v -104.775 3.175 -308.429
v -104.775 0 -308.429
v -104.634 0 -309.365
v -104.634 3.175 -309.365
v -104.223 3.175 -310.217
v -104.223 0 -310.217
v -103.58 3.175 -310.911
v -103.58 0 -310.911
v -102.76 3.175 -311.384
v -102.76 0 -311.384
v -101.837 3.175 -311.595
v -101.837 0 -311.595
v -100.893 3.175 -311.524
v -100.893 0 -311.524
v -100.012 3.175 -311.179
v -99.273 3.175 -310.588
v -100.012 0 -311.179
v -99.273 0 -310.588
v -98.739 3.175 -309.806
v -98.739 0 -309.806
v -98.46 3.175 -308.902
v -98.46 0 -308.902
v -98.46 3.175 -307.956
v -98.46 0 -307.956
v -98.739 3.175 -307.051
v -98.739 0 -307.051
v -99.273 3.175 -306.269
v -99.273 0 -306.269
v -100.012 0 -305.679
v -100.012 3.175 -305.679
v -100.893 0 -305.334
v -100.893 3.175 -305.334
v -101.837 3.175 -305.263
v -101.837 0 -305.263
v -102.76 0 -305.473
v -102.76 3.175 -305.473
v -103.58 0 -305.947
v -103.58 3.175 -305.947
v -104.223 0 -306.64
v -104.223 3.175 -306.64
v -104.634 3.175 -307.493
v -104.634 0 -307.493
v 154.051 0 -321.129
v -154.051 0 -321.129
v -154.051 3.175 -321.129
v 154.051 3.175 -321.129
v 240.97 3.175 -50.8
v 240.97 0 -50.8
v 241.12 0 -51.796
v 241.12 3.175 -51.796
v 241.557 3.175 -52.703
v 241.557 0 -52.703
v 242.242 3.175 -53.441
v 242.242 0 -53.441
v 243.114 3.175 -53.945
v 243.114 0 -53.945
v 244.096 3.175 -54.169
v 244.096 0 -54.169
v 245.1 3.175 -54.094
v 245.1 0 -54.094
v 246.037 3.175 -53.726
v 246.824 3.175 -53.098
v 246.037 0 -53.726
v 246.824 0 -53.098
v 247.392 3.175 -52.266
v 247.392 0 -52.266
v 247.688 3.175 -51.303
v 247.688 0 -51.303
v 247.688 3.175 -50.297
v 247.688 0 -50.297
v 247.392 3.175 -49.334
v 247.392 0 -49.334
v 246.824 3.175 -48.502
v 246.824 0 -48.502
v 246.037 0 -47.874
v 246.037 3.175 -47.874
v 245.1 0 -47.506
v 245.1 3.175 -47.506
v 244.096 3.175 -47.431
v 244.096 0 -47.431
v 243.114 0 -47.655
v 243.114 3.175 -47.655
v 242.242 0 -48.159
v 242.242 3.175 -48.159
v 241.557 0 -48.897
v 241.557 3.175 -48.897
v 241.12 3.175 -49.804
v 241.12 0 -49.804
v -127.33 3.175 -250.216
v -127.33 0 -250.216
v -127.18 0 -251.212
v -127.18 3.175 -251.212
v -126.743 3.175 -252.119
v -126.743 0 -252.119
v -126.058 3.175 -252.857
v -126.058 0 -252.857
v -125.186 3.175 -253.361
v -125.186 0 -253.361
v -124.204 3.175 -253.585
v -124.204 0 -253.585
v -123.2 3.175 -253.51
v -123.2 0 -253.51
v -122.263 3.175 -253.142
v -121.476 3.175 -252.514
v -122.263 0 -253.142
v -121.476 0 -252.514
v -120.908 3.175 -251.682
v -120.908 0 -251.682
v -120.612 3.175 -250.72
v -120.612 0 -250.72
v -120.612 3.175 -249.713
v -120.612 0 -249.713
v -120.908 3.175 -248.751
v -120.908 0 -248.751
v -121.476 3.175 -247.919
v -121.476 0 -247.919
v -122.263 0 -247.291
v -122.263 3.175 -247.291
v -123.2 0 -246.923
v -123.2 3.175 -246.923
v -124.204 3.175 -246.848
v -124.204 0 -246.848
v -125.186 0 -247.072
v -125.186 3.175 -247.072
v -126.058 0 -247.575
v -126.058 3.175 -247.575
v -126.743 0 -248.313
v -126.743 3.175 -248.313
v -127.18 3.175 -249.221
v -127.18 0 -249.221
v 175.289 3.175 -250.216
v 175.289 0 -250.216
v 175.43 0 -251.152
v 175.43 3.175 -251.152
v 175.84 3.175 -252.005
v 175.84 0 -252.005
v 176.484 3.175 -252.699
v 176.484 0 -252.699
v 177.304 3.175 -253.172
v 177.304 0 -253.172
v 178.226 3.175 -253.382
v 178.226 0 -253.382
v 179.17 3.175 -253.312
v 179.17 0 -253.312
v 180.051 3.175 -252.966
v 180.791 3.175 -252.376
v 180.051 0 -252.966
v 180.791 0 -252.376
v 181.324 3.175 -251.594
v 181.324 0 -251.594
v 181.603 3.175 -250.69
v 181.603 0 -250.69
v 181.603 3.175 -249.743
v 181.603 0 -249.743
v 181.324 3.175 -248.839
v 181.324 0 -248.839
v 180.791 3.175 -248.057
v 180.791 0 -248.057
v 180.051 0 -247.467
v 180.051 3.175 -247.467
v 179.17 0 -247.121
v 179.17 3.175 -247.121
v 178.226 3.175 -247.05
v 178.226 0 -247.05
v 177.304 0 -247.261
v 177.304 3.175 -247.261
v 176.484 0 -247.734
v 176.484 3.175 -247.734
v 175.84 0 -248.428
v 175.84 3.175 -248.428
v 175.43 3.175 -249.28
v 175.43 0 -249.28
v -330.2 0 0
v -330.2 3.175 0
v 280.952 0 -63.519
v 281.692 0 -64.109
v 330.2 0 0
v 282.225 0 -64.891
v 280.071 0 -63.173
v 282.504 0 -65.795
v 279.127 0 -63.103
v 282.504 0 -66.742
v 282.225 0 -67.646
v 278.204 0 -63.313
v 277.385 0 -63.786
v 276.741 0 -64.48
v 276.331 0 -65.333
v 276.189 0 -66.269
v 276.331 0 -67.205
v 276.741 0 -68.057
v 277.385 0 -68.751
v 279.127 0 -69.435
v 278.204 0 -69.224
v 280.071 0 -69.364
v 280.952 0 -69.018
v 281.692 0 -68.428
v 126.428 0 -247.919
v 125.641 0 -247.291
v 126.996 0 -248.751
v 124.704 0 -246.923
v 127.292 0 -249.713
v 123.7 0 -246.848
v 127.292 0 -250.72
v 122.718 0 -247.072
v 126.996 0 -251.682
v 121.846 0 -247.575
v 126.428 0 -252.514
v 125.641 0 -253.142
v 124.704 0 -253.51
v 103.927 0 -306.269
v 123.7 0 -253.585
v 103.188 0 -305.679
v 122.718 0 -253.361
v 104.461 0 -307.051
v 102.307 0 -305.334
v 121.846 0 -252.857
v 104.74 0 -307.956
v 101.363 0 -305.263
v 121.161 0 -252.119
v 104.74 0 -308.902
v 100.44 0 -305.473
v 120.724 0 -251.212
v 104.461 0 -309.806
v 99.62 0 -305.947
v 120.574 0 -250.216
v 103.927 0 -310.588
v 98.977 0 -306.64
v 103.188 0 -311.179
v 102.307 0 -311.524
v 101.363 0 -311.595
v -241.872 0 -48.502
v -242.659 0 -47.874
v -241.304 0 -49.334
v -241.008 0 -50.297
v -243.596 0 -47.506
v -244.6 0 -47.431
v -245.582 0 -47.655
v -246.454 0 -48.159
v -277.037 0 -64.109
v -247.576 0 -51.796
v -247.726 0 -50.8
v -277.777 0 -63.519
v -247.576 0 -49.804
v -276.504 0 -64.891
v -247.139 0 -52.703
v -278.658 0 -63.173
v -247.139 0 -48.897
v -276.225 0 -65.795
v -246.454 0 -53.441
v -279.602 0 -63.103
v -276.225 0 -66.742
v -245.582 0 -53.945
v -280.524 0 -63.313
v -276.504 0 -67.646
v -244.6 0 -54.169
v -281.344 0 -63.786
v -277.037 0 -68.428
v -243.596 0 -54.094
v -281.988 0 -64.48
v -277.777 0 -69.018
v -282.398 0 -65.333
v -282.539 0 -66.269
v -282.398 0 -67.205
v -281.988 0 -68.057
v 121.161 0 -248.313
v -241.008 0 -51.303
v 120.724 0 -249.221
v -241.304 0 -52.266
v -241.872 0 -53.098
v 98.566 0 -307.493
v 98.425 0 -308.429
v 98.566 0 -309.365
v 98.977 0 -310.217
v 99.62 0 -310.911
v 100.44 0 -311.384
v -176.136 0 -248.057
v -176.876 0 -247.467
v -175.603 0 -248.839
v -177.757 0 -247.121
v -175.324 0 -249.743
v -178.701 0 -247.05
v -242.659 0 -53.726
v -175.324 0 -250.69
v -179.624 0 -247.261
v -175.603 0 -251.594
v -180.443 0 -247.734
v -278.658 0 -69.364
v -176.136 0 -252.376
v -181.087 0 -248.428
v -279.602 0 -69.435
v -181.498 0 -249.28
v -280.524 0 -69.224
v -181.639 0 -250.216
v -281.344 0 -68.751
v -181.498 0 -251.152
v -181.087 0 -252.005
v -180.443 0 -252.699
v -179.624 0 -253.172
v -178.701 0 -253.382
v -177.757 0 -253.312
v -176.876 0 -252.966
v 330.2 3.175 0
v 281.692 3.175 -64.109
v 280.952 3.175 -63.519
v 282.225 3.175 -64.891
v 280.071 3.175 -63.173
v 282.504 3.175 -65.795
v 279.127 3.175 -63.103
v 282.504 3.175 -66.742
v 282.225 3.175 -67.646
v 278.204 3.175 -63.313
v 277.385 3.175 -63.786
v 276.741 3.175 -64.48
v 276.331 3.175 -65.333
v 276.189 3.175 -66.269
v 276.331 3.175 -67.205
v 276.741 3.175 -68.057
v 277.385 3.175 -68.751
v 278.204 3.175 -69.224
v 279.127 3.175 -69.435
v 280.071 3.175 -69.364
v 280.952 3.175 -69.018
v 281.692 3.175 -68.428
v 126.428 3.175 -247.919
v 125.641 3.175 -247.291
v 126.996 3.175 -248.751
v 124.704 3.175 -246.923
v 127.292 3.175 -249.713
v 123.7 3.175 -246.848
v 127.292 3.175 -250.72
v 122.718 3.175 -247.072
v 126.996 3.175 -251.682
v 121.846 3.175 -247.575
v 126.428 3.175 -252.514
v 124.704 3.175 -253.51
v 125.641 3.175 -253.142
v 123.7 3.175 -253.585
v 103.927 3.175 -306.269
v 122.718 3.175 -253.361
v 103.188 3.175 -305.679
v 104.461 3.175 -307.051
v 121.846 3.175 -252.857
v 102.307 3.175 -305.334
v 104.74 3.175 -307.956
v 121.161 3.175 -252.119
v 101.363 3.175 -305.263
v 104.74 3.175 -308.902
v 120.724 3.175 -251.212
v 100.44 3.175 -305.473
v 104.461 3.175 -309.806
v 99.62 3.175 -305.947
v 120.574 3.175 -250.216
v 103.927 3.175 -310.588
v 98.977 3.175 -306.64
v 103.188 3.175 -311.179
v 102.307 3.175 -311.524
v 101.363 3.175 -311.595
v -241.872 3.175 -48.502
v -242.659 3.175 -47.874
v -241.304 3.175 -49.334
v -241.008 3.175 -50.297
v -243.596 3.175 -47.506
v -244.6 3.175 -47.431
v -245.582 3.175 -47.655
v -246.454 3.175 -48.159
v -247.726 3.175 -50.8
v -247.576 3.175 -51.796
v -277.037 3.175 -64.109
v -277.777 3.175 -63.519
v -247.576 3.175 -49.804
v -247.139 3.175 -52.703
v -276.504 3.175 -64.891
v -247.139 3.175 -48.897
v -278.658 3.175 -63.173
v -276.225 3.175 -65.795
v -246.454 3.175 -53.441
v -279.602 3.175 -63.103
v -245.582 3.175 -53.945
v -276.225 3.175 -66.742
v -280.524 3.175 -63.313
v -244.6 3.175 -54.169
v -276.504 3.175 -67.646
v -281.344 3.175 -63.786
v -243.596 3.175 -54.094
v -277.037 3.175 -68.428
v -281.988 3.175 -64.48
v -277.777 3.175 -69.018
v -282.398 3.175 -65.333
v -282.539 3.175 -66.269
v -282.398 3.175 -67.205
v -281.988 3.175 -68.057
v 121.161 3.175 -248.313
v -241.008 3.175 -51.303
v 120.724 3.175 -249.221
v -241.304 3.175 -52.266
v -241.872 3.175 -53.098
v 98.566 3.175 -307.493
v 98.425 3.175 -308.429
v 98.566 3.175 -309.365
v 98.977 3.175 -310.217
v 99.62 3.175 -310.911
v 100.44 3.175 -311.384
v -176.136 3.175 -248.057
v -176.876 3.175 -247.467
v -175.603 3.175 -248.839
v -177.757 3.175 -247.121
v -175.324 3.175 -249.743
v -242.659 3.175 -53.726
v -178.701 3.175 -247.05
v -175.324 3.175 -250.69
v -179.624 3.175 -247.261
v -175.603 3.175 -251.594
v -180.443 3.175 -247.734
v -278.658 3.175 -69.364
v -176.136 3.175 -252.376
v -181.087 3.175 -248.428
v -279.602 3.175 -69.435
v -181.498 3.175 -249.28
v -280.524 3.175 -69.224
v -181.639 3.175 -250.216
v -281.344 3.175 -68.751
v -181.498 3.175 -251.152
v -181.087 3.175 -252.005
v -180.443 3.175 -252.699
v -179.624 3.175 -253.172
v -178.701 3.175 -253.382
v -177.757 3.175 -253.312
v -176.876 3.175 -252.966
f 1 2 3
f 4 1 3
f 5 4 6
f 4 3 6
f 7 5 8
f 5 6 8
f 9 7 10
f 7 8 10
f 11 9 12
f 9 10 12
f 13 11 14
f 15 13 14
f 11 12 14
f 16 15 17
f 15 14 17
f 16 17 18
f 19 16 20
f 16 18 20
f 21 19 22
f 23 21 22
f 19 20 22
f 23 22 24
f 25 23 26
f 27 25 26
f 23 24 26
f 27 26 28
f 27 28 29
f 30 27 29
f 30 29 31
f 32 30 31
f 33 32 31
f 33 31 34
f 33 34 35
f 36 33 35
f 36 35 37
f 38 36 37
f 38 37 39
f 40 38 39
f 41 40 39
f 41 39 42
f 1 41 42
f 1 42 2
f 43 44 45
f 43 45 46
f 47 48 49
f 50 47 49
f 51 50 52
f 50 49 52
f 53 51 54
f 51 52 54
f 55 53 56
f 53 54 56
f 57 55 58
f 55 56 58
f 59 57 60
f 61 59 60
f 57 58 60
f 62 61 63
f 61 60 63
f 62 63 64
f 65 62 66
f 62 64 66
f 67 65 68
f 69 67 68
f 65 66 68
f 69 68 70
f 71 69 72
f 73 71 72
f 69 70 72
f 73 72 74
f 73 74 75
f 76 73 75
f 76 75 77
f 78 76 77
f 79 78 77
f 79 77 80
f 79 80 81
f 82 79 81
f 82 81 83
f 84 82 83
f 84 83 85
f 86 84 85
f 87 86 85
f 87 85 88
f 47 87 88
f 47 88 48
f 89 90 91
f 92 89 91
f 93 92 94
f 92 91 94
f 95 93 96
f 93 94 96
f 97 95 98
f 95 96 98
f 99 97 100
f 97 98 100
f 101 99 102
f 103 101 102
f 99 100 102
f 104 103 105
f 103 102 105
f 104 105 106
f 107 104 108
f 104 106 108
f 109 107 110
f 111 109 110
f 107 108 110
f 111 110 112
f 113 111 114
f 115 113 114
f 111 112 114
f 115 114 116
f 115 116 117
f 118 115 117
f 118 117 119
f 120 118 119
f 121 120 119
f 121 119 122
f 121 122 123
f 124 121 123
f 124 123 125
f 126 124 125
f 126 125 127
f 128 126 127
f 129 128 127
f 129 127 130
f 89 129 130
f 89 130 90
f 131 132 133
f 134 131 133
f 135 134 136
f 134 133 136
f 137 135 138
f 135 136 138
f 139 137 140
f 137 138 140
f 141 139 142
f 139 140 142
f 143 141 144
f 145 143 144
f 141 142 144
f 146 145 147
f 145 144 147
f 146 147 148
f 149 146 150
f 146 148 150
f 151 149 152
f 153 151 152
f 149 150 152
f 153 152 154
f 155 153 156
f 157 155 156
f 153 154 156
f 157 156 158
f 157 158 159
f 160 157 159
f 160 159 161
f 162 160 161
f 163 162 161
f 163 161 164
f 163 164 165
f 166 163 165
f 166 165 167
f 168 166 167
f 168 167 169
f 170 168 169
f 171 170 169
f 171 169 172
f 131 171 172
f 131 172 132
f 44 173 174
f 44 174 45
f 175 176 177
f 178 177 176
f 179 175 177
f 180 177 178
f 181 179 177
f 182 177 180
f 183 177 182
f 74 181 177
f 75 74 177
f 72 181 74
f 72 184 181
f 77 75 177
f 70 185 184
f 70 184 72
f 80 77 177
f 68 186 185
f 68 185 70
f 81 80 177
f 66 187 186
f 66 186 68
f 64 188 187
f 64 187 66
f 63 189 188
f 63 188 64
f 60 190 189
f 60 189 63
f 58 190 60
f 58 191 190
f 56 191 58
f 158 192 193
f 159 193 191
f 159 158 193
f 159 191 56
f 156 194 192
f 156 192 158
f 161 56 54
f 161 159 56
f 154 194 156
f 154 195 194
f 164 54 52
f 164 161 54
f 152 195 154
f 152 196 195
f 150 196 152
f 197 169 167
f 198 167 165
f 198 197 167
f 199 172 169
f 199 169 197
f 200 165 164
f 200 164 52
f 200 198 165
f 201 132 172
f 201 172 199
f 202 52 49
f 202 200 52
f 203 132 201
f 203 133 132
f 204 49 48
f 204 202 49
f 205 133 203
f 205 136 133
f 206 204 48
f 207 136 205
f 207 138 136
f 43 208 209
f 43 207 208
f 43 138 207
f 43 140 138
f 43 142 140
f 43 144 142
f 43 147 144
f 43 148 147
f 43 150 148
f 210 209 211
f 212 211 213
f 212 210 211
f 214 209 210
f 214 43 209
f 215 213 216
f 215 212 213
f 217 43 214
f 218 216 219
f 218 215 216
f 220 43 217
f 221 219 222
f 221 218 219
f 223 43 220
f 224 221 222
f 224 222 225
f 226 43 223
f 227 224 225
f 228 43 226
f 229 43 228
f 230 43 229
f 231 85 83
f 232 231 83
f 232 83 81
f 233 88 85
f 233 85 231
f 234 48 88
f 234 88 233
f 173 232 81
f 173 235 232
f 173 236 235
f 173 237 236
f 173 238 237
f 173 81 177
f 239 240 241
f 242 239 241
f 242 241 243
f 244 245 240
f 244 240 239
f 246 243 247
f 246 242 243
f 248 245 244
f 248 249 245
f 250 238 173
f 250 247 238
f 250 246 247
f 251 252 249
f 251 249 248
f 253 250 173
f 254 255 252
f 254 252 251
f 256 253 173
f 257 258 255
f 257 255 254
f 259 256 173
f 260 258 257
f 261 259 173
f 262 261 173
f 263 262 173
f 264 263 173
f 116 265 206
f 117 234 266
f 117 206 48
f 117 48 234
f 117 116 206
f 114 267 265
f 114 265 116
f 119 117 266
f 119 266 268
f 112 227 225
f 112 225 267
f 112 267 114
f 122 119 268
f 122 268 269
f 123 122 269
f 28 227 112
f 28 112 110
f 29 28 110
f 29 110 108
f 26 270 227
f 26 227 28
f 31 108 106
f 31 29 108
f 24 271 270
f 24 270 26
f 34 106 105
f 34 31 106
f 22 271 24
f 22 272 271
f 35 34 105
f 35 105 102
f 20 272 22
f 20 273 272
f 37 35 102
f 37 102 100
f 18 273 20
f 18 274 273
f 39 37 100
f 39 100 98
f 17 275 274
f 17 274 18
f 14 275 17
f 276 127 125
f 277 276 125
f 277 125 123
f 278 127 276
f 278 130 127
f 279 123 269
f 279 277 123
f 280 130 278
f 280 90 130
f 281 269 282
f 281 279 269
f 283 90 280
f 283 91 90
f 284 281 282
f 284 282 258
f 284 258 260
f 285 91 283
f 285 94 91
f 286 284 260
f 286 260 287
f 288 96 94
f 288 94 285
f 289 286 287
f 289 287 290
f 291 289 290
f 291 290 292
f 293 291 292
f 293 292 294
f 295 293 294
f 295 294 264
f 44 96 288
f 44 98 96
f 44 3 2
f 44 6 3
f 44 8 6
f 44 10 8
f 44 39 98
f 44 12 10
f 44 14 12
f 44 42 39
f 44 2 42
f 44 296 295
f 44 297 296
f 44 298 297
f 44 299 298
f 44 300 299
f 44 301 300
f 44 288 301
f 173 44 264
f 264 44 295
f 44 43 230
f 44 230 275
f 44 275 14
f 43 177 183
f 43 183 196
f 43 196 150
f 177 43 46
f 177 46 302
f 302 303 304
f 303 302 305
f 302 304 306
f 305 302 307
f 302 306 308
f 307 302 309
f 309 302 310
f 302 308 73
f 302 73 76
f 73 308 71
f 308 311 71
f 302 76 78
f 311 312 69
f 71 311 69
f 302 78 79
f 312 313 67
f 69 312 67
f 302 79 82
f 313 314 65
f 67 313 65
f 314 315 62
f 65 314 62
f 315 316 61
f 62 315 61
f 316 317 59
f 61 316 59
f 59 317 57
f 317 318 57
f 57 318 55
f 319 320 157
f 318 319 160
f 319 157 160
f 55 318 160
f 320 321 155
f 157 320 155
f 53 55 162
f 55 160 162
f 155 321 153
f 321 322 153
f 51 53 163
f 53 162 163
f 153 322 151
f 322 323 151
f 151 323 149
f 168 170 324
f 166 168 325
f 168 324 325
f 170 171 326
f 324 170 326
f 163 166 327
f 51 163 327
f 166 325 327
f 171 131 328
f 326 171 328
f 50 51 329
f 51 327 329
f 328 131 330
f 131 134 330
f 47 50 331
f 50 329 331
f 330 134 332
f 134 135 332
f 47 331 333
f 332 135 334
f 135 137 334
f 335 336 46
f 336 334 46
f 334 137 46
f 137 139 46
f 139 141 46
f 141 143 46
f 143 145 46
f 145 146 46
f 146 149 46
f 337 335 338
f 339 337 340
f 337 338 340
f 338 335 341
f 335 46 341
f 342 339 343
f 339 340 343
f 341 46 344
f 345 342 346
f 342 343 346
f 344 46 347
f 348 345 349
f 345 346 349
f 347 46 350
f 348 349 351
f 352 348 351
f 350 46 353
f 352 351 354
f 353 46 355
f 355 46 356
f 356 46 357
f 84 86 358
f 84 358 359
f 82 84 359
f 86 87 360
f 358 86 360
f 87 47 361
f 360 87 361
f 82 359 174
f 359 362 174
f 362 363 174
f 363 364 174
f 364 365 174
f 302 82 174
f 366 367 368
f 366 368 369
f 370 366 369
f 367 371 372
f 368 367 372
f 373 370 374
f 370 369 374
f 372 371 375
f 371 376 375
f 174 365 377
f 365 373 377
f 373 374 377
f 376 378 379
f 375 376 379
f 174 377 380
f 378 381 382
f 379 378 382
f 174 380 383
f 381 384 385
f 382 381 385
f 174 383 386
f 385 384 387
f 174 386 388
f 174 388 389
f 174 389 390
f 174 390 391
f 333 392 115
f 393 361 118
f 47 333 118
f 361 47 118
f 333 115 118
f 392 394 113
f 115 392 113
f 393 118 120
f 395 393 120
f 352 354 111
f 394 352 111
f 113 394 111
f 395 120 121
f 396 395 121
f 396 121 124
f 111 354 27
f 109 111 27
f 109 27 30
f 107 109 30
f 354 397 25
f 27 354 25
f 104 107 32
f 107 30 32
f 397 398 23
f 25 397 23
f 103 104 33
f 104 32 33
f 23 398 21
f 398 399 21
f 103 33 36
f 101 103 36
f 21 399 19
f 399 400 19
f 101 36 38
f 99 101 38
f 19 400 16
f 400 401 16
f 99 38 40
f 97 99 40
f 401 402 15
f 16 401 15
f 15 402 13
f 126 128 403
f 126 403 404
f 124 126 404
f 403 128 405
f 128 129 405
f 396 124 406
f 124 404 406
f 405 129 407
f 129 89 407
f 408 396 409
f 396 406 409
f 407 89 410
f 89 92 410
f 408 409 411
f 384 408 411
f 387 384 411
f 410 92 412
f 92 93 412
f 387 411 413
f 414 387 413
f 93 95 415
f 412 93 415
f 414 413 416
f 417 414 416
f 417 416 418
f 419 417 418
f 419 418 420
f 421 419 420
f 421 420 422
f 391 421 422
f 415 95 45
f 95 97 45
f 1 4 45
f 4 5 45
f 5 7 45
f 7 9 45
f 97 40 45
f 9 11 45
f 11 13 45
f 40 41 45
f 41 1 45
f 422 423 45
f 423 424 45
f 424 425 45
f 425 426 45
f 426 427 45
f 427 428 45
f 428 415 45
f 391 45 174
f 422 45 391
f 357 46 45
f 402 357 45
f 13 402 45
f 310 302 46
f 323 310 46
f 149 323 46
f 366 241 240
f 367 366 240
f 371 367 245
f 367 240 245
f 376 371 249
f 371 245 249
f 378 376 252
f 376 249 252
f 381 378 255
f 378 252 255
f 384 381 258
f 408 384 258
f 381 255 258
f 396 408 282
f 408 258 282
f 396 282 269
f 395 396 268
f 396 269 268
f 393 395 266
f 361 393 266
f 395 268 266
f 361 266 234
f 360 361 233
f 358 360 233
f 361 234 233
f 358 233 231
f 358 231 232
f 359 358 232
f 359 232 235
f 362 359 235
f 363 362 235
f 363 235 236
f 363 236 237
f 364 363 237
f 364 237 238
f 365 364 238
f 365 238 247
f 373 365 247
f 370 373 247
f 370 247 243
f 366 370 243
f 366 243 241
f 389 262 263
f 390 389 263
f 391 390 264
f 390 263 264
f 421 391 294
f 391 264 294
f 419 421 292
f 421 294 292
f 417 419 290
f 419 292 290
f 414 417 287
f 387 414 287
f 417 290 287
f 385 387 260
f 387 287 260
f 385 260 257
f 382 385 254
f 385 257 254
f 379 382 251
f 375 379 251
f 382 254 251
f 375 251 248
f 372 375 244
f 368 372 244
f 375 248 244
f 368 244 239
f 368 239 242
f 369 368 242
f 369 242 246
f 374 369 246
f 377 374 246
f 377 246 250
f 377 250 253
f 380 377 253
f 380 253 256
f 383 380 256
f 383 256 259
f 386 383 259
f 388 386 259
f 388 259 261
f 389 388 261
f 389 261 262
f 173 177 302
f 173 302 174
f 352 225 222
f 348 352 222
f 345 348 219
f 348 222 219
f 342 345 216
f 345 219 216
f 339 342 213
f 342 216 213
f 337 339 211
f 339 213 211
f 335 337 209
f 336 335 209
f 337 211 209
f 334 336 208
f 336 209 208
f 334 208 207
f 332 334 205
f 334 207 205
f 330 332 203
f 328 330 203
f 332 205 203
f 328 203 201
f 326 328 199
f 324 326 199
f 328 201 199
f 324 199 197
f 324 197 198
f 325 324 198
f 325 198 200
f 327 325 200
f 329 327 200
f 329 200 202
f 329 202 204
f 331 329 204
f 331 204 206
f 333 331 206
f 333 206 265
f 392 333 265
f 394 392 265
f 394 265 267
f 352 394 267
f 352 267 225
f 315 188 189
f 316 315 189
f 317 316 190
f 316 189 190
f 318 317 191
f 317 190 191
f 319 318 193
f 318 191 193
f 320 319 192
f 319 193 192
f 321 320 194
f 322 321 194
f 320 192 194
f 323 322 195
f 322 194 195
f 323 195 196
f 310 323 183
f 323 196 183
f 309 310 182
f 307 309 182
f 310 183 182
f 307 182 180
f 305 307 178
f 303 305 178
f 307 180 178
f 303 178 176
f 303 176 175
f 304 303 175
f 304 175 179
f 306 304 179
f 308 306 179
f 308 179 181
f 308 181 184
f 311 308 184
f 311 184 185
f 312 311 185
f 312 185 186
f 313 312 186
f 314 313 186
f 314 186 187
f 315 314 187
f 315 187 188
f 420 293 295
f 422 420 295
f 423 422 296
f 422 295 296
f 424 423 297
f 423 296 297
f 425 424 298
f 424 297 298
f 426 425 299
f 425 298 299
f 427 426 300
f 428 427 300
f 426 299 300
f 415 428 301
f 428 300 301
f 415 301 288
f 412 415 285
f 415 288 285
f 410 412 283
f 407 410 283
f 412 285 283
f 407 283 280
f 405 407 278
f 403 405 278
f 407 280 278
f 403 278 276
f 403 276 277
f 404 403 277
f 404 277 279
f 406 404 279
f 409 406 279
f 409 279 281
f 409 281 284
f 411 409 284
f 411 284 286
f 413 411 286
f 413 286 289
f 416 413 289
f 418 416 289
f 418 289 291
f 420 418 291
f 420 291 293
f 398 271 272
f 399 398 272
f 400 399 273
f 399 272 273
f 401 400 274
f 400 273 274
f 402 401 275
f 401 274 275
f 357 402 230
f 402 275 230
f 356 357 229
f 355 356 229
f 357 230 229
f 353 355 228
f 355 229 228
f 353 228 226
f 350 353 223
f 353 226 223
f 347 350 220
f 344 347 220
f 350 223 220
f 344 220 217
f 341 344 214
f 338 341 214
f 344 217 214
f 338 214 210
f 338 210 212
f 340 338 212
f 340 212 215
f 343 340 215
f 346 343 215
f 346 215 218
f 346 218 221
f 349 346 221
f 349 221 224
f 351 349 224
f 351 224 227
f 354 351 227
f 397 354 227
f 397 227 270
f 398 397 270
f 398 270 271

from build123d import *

# Parameters (mm, degrees)
BOSS_EXTRUDE1_DEPTH         = 3.175
F_1_4_0_25_DIAMETER_HOLE1_D = 6.35
F_1_4_CLEARANCE_HOLE1_D     = 6.7564


with BuildPart() as part:
    # Sketch1 → Boss-Extrude1 (new body)
    with BuildSketch(Plane(origin=(0, 0, 0), x_dir=(1, 0, 0), z_dir=(0, 1, 0))):
        Polygon((-330.2, 0), (-154.051, 321.128911223), (154.051, 321.128911223), (330.2, 0), align=None)
    extrude(amount=BOSS_EXTRUDE1_DEPTH)

    # 1/4 (0.25) Diameter Hole1 (through all)
    with Locations(Plane(origin=(0, 3.175, 0), x_dir=(1, 0, 0), z_dir=(0, 1, 0))):
        with Locations((-279.364444826, 66.268686649), (-178.463561331, 250.216315407), (-101.6, 308.428911223), (279.364444826, 66.268686649), (178.463561331, 250.216315407), (101.6, 308.428911223)):
            Hole(F_1_4_0_25_DIAMETER_HOLE1_D / 2)

    # 1/4 Clearance Hole1 (through all)
    with Locations(Plane(origin=(0, 3.175, 0), x_dir=(1, 0, 0), z_dir=(0, 1, 0))):
        with Locations((-123.952, 250.216315407), (-244.348, 50.8), (244.348, 50.8), (123.952, 250.216315407)):
            Hole(F_1_4_CLEARANCE_HOLE1_D / 2)


solid = part.part
